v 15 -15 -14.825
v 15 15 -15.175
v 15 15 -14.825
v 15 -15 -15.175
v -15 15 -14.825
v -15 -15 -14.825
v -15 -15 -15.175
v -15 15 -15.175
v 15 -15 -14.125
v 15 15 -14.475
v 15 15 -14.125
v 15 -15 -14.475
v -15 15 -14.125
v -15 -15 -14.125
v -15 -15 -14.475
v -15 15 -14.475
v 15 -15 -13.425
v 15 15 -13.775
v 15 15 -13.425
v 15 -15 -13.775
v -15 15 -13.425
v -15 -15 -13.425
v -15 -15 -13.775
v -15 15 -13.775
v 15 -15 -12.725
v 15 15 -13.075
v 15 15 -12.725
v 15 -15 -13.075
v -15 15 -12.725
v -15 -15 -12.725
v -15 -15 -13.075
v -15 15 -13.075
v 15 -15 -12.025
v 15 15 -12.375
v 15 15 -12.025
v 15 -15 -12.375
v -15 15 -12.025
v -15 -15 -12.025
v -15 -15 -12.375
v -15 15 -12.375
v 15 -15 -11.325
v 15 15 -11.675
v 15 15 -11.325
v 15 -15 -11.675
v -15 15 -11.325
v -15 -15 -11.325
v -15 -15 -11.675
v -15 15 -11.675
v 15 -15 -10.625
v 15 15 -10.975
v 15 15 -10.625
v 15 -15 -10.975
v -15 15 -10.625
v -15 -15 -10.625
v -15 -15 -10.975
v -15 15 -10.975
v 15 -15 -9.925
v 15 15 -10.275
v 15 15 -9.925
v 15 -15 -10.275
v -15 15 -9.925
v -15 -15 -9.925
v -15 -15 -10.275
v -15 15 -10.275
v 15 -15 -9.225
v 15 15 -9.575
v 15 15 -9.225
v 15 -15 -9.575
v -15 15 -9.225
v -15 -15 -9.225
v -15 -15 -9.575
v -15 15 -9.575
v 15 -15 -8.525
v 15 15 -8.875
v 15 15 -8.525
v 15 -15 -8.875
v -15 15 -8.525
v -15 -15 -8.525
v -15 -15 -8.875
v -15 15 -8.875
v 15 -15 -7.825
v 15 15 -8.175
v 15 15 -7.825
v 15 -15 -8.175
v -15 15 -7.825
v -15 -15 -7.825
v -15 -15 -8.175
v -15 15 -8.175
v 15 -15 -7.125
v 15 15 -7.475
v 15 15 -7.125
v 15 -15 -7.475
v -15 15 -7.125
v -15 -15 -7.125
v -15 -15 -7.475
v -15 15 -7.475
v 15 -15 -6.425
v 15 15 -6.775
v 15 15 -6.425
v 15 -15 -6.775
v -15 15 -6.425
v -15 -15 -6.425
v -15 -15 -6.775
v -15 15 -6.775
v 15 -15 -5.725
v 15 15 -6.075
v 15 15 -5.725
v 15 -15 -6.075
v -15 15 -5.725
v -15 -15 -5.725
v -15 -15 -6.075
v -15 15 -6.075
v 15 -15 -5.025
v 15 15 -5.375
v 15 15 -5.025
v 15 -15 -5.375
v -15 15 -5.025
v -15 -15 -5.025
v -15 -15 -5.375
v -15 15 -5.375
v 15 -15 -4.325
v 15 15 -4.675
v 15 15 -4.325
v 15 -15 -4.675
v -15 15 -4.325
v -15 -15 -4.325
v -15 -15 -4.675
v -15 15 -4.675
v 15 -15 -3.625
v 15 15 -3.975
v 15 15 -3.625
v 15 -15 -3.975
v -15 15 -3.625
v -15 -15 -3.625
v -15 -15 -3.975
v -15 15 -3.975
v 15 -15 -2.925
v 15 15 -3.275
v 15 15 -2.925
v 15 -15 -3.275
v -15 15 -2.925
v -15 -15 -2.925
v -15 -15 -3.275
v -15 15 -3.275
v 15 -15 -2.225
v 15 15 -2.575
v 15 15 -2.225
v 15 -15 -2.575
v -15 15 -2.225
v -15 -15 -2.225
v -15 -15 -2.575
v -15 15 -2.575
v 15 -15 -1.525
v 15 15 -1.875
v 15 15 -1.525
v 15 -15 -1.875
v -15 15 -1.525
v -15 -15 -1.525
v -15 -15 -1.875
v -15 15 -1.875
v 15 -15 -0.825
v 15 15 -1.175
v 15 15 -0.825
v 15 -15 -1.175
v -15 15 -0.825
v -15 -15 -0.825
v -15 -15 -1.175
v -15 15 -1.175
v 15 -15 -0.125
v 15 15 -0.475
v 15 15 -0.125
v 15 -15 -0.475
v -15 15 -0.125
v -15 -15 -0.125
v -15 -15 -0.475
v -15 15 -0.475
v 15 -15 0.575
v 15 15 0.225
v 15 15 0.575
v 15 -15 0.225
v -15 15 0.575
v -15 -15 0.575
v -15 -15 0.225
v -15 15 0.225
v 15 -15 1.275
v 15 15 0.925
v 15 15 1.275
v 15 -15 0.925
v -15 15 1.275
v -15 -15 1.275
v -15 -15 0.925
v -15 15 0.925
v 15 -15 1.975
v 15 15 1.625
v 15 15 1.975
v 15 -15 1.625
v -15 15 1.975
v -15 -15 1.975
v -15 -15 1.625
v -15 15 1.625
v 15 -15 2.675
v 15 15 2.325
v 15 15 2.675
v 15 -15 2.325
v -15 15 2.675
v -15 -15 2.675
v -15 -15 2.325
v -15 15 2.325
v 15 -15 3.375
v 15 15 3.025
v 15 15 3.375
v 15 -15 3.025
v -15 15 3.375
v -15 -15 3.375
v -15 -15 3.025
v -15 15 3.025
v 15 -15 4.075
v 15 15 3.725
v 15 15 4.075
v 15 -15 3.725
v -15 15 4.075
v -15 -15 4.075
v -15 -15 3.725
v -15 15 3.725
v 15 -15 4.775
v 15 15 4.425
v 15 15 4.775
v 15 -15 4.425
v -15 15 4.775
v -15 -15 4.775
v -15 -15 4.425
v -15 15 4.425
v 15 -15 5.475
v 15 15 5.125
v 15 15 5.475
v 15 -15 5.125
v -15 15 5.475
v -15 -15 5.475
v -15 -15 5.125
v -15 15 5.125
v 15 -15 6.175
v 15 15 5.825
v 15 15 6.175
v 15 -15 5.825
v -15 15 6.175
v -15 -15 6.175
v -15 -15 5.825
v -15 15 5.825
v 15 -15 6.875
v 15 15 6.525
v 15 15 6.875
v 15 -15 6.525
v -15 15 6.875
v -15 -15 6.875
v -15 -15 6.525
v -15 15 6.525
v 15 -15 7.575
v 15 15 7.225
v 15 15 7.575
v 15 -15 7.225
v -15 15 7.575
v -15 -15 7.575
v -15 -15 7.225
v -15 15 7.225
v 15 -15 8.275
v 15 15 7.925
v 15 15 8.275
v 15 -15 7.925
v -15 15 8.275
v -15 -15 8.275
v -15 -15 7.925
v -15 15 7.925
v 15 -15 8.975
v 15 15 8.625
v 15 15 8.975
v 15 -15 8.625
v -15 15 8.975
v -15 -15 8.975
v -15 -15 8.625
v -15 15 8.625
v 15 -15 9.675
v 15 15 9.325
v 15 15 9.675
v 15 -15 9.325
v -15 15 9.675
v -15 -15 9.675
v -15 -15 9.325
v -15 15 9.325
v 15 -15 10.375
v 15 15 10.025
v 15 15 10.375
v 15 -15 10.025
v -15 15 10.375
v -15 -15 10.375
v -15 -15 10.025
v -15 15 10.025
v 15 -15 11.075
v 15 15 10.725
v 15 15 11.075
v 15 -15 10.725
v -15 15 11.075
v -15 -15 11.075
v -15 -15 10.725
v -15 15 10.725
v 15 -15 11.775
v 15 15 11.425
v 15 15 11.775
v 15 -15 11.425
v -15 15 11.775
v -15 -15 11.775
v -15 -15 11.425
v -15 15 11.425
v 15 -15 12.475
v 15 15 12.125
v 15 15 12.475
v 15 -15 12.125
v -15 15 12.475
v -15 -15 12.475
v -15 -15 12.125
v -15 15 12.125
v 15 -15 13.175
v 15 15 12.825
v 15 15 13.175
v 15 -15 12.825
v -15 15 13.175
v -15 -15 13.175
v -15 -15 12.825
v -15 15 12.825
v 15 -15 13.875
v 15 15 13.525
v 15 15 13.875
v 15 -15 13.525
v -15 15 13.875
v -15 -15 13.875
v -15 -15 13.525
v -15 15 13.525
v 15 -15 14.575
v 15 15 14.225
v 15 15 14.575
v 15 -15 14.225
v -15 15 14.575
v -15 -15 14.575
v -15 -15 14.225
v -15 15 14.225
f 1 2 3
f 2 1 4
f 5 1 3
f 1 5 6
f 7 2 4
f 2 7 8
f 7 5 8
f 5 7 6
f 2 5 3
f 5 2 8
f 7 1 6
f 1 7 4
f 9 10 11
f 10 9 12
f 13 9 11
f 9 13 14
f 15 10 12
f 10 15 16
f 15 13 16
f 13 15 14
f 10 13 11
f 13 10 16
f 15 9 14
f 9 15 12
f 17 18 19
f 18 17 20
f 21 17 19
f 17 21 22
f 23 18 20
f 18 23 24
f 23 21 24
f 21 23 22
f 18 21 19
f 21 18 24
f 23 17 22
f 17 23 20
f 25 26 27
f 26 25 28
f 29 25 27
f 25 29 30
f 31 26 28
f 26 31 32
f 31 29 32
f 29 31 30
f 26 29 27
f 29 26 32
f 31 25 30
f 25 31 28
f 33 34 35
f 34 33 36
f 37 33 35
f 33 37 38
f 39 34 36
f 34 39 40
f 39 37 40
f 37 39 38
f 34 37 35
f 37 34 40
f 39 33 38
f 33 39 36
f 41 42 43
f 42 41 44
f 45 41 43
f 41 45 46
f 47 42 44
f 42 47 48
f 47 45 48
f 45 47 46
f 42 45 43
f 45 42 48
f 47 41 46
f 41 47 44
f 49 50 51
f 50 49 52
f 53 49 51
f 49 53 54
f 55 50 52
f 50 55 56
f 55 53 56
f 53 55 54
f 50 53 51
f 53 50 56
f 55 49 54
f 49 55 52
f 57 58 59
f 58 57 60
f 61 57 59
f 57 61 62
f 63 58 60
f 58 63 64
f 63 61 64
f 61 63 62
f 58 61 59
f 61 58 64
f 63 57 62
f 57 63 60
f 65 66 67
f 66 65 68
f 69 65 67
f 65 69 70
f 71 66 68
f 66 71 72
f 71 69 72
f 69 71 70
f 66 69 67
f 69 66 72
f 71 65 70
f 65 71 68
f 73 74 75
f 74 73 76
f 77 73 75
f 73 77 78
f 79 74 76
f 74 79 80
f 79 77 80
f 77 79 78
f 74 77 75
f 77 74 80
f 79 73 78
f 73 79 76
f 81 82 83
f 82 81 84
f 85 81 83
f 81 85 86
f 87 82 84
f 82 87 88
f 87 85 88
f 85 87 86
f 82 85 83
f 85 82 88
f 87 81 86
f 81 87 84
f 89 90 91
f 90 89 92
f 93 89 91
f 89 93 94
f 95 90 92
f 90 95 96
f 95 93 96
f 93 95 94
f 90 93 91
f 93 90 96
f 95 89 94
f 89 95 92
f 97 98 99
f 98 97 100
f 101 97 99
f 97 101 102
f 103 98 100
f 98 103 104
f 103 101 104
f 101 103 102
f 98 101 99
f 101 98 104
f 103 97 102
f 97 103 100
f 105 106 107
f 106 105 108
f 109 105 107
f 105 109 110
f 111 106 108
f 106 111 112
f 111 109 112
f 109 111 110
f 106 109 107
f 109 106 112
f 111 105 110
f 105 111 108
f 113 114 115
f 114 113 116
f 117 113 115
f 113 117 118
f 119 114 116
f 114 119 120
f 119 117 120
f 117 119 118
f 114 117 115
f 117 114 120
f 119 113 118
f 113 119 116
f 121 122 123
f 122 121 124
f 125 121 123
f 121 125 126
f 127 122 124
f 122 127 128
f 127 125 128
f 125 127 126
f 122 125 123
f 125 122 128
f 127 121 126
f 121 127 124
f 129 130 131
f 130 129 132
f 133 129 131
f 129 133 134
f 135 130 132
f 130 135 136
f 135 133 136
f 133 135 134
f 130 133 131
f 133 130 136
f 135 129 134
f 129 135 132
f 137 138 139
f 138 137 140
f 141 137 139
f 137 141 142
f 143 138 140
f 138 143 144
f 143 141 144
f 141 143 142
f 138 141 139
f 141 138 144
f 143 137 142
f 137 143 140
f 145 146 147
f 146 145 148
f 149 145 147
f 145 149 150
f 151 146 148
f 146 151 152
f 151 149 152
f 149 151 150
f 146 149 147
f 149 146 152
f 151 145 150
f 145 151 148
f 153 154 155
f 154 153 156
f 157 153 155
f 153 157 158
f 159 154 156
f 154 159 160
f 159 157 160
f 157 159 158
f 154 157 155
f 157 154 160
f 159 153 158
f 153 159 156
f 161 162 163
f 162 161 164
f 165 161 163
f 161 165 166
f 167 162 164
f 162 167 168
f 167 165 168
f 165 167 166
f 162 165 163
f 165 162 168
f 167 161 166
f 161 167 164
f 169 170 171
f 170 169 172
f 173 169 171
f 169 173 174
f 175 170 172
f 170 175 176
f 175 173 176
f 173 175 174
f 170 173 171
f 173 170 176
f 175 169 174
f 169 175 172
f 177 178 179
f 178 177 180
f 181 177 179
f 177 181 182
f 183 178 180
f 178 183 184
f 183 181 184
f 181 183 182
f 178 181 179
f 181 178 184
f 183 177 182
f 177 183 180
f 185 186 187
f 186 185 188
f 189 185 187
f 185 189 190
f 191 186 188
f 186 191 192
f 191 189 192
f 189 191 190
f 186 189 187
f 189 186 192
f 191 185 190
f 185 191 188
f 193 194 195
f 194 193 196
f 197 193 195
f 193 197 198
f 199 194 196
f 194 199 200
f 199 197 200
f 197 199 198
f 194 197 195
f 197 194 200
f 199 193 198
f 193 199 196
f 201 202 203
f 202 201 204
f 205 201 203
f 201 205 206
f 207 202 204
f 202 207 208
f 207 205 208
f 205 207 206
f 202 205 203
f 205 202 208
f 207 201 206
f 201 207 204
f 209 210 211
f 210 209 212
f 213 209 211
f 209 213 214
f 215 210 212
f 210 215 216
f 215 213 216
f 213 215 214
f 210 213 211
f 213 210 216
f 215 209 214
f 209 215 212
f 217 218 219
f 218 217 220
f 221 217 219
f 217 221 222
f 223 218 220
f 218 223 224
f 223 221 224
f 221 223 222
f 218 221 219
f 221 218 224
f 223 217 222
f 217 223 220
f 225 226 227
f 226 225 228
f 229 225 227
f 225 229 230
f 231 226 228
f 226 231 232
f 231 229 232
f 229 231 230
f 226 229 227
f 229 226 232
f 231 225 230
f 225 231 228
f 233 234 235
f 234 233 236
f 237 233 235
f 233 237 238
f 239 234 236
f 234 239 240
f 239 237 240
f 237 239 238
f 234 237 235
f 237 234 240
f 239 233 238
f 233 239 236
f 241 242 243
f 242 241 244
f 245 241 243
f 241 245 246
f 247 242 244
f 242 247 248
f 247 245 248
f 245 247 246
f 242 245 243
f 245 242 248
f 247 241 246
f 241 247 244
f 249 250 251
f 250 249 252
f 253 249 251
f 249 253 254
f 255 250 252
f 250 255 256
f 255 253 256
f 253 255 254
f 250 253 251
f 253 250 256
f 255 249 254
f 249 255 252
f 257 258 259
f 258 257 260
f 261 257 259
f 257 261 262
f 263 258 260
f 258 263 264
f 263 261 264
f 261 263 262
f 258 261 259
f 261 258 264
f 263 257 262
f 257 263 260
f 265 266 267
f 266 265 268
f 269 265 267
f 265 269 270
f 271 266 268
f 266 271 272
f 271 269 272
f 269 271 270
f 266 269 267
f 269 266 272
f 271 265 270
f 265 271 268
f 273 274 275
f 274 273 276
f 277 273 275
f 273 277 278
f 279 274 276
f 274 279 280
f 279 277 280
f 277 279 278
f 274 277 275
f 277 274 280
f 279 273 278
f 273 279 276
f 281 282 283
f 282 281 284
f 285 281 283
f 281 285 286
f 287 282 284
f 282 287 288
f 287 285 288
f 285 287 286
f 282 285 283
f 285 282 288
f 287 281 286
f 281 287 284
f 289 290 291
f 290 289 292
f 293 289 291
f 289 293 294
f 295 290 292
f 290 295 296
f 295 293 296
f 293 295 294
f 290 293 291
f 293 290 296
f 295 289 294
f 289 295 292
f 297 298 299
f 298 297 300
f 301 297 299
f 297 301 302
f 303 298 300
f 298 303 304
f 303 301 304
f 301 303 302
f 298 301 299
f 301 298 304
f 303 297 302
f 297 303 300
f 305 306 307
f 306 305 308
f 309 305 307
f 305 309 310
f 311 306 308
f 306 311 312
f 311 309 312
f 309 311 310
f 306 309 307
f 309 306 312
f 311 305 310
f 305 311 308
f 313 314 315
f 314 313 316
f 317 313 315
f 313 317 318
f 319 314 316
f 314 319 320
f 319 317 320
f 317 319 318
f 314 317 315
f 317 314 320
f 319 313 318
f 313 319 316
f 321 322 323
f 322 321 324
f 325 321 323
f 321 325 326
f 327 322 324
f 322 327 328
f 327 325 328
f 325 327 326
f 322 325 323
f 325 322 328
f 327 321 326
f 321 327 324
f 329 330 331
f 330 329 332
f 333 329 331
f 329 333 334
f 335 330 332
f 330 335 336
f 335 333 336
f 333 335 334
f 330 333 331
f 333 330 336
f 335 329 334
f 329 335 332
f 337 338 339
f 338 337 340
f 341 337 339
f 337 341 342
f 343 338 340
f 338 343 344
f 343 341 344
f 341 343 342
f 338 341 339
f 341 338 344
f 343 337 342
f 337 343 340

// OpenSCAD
/*
Module AntiSupport, Fred Schade 21.08.218
-----------------------------------------------
->usefull to avoid Supportmaterial in specified holes for Slic3r
->insert the AntiSupport at the end of your script
-----------------------------------------------
Variables:
------------
Cube: vector with size of the hole
Position: vector with Coordinates of the hole
nozzle: size of the printed layer
hor: boolean Variable for orientation of the supported material (true= horizontal, false=vertical in OpenScad).
      ! must be vertical to the print direction, otherwise it doesn't work!
center: boolean variable like center in cube,cylinder etc. 
--------------------------------------------------
example:
----------
//hole
translate(P) cube(C,center=false)
// AntiSupport
AntiSupport(Cube=C,Position=P,hor=false, center= false);
---------------------------------------------------------
*/

module AntiSupport(Cube=[30,30,30], Position=[0,0,0], nozzle=0.35, hor=false, center=true)
{
    x=Cube[0];
    y=Cube[1];
    z=Cube[2];
    if (!center){
         translate(Position + [x/2,y/2,z/2]) bar();
    }
    else{
        translate(Position) bar();
    }
    
    module bar(){
    if (hor)
        {
            for (i=[-x/2:2*nozzle:x/2]){ translate([i,0,0])cube([nozzle,y,z],true);}
        }
     else 
        {
            for (i=[-z/2:2*nozzle:z/2]){ translate([0,0,i])cube([x,y,nozzle],true);}
        }
     }
}


AntiSupport(center=true);
